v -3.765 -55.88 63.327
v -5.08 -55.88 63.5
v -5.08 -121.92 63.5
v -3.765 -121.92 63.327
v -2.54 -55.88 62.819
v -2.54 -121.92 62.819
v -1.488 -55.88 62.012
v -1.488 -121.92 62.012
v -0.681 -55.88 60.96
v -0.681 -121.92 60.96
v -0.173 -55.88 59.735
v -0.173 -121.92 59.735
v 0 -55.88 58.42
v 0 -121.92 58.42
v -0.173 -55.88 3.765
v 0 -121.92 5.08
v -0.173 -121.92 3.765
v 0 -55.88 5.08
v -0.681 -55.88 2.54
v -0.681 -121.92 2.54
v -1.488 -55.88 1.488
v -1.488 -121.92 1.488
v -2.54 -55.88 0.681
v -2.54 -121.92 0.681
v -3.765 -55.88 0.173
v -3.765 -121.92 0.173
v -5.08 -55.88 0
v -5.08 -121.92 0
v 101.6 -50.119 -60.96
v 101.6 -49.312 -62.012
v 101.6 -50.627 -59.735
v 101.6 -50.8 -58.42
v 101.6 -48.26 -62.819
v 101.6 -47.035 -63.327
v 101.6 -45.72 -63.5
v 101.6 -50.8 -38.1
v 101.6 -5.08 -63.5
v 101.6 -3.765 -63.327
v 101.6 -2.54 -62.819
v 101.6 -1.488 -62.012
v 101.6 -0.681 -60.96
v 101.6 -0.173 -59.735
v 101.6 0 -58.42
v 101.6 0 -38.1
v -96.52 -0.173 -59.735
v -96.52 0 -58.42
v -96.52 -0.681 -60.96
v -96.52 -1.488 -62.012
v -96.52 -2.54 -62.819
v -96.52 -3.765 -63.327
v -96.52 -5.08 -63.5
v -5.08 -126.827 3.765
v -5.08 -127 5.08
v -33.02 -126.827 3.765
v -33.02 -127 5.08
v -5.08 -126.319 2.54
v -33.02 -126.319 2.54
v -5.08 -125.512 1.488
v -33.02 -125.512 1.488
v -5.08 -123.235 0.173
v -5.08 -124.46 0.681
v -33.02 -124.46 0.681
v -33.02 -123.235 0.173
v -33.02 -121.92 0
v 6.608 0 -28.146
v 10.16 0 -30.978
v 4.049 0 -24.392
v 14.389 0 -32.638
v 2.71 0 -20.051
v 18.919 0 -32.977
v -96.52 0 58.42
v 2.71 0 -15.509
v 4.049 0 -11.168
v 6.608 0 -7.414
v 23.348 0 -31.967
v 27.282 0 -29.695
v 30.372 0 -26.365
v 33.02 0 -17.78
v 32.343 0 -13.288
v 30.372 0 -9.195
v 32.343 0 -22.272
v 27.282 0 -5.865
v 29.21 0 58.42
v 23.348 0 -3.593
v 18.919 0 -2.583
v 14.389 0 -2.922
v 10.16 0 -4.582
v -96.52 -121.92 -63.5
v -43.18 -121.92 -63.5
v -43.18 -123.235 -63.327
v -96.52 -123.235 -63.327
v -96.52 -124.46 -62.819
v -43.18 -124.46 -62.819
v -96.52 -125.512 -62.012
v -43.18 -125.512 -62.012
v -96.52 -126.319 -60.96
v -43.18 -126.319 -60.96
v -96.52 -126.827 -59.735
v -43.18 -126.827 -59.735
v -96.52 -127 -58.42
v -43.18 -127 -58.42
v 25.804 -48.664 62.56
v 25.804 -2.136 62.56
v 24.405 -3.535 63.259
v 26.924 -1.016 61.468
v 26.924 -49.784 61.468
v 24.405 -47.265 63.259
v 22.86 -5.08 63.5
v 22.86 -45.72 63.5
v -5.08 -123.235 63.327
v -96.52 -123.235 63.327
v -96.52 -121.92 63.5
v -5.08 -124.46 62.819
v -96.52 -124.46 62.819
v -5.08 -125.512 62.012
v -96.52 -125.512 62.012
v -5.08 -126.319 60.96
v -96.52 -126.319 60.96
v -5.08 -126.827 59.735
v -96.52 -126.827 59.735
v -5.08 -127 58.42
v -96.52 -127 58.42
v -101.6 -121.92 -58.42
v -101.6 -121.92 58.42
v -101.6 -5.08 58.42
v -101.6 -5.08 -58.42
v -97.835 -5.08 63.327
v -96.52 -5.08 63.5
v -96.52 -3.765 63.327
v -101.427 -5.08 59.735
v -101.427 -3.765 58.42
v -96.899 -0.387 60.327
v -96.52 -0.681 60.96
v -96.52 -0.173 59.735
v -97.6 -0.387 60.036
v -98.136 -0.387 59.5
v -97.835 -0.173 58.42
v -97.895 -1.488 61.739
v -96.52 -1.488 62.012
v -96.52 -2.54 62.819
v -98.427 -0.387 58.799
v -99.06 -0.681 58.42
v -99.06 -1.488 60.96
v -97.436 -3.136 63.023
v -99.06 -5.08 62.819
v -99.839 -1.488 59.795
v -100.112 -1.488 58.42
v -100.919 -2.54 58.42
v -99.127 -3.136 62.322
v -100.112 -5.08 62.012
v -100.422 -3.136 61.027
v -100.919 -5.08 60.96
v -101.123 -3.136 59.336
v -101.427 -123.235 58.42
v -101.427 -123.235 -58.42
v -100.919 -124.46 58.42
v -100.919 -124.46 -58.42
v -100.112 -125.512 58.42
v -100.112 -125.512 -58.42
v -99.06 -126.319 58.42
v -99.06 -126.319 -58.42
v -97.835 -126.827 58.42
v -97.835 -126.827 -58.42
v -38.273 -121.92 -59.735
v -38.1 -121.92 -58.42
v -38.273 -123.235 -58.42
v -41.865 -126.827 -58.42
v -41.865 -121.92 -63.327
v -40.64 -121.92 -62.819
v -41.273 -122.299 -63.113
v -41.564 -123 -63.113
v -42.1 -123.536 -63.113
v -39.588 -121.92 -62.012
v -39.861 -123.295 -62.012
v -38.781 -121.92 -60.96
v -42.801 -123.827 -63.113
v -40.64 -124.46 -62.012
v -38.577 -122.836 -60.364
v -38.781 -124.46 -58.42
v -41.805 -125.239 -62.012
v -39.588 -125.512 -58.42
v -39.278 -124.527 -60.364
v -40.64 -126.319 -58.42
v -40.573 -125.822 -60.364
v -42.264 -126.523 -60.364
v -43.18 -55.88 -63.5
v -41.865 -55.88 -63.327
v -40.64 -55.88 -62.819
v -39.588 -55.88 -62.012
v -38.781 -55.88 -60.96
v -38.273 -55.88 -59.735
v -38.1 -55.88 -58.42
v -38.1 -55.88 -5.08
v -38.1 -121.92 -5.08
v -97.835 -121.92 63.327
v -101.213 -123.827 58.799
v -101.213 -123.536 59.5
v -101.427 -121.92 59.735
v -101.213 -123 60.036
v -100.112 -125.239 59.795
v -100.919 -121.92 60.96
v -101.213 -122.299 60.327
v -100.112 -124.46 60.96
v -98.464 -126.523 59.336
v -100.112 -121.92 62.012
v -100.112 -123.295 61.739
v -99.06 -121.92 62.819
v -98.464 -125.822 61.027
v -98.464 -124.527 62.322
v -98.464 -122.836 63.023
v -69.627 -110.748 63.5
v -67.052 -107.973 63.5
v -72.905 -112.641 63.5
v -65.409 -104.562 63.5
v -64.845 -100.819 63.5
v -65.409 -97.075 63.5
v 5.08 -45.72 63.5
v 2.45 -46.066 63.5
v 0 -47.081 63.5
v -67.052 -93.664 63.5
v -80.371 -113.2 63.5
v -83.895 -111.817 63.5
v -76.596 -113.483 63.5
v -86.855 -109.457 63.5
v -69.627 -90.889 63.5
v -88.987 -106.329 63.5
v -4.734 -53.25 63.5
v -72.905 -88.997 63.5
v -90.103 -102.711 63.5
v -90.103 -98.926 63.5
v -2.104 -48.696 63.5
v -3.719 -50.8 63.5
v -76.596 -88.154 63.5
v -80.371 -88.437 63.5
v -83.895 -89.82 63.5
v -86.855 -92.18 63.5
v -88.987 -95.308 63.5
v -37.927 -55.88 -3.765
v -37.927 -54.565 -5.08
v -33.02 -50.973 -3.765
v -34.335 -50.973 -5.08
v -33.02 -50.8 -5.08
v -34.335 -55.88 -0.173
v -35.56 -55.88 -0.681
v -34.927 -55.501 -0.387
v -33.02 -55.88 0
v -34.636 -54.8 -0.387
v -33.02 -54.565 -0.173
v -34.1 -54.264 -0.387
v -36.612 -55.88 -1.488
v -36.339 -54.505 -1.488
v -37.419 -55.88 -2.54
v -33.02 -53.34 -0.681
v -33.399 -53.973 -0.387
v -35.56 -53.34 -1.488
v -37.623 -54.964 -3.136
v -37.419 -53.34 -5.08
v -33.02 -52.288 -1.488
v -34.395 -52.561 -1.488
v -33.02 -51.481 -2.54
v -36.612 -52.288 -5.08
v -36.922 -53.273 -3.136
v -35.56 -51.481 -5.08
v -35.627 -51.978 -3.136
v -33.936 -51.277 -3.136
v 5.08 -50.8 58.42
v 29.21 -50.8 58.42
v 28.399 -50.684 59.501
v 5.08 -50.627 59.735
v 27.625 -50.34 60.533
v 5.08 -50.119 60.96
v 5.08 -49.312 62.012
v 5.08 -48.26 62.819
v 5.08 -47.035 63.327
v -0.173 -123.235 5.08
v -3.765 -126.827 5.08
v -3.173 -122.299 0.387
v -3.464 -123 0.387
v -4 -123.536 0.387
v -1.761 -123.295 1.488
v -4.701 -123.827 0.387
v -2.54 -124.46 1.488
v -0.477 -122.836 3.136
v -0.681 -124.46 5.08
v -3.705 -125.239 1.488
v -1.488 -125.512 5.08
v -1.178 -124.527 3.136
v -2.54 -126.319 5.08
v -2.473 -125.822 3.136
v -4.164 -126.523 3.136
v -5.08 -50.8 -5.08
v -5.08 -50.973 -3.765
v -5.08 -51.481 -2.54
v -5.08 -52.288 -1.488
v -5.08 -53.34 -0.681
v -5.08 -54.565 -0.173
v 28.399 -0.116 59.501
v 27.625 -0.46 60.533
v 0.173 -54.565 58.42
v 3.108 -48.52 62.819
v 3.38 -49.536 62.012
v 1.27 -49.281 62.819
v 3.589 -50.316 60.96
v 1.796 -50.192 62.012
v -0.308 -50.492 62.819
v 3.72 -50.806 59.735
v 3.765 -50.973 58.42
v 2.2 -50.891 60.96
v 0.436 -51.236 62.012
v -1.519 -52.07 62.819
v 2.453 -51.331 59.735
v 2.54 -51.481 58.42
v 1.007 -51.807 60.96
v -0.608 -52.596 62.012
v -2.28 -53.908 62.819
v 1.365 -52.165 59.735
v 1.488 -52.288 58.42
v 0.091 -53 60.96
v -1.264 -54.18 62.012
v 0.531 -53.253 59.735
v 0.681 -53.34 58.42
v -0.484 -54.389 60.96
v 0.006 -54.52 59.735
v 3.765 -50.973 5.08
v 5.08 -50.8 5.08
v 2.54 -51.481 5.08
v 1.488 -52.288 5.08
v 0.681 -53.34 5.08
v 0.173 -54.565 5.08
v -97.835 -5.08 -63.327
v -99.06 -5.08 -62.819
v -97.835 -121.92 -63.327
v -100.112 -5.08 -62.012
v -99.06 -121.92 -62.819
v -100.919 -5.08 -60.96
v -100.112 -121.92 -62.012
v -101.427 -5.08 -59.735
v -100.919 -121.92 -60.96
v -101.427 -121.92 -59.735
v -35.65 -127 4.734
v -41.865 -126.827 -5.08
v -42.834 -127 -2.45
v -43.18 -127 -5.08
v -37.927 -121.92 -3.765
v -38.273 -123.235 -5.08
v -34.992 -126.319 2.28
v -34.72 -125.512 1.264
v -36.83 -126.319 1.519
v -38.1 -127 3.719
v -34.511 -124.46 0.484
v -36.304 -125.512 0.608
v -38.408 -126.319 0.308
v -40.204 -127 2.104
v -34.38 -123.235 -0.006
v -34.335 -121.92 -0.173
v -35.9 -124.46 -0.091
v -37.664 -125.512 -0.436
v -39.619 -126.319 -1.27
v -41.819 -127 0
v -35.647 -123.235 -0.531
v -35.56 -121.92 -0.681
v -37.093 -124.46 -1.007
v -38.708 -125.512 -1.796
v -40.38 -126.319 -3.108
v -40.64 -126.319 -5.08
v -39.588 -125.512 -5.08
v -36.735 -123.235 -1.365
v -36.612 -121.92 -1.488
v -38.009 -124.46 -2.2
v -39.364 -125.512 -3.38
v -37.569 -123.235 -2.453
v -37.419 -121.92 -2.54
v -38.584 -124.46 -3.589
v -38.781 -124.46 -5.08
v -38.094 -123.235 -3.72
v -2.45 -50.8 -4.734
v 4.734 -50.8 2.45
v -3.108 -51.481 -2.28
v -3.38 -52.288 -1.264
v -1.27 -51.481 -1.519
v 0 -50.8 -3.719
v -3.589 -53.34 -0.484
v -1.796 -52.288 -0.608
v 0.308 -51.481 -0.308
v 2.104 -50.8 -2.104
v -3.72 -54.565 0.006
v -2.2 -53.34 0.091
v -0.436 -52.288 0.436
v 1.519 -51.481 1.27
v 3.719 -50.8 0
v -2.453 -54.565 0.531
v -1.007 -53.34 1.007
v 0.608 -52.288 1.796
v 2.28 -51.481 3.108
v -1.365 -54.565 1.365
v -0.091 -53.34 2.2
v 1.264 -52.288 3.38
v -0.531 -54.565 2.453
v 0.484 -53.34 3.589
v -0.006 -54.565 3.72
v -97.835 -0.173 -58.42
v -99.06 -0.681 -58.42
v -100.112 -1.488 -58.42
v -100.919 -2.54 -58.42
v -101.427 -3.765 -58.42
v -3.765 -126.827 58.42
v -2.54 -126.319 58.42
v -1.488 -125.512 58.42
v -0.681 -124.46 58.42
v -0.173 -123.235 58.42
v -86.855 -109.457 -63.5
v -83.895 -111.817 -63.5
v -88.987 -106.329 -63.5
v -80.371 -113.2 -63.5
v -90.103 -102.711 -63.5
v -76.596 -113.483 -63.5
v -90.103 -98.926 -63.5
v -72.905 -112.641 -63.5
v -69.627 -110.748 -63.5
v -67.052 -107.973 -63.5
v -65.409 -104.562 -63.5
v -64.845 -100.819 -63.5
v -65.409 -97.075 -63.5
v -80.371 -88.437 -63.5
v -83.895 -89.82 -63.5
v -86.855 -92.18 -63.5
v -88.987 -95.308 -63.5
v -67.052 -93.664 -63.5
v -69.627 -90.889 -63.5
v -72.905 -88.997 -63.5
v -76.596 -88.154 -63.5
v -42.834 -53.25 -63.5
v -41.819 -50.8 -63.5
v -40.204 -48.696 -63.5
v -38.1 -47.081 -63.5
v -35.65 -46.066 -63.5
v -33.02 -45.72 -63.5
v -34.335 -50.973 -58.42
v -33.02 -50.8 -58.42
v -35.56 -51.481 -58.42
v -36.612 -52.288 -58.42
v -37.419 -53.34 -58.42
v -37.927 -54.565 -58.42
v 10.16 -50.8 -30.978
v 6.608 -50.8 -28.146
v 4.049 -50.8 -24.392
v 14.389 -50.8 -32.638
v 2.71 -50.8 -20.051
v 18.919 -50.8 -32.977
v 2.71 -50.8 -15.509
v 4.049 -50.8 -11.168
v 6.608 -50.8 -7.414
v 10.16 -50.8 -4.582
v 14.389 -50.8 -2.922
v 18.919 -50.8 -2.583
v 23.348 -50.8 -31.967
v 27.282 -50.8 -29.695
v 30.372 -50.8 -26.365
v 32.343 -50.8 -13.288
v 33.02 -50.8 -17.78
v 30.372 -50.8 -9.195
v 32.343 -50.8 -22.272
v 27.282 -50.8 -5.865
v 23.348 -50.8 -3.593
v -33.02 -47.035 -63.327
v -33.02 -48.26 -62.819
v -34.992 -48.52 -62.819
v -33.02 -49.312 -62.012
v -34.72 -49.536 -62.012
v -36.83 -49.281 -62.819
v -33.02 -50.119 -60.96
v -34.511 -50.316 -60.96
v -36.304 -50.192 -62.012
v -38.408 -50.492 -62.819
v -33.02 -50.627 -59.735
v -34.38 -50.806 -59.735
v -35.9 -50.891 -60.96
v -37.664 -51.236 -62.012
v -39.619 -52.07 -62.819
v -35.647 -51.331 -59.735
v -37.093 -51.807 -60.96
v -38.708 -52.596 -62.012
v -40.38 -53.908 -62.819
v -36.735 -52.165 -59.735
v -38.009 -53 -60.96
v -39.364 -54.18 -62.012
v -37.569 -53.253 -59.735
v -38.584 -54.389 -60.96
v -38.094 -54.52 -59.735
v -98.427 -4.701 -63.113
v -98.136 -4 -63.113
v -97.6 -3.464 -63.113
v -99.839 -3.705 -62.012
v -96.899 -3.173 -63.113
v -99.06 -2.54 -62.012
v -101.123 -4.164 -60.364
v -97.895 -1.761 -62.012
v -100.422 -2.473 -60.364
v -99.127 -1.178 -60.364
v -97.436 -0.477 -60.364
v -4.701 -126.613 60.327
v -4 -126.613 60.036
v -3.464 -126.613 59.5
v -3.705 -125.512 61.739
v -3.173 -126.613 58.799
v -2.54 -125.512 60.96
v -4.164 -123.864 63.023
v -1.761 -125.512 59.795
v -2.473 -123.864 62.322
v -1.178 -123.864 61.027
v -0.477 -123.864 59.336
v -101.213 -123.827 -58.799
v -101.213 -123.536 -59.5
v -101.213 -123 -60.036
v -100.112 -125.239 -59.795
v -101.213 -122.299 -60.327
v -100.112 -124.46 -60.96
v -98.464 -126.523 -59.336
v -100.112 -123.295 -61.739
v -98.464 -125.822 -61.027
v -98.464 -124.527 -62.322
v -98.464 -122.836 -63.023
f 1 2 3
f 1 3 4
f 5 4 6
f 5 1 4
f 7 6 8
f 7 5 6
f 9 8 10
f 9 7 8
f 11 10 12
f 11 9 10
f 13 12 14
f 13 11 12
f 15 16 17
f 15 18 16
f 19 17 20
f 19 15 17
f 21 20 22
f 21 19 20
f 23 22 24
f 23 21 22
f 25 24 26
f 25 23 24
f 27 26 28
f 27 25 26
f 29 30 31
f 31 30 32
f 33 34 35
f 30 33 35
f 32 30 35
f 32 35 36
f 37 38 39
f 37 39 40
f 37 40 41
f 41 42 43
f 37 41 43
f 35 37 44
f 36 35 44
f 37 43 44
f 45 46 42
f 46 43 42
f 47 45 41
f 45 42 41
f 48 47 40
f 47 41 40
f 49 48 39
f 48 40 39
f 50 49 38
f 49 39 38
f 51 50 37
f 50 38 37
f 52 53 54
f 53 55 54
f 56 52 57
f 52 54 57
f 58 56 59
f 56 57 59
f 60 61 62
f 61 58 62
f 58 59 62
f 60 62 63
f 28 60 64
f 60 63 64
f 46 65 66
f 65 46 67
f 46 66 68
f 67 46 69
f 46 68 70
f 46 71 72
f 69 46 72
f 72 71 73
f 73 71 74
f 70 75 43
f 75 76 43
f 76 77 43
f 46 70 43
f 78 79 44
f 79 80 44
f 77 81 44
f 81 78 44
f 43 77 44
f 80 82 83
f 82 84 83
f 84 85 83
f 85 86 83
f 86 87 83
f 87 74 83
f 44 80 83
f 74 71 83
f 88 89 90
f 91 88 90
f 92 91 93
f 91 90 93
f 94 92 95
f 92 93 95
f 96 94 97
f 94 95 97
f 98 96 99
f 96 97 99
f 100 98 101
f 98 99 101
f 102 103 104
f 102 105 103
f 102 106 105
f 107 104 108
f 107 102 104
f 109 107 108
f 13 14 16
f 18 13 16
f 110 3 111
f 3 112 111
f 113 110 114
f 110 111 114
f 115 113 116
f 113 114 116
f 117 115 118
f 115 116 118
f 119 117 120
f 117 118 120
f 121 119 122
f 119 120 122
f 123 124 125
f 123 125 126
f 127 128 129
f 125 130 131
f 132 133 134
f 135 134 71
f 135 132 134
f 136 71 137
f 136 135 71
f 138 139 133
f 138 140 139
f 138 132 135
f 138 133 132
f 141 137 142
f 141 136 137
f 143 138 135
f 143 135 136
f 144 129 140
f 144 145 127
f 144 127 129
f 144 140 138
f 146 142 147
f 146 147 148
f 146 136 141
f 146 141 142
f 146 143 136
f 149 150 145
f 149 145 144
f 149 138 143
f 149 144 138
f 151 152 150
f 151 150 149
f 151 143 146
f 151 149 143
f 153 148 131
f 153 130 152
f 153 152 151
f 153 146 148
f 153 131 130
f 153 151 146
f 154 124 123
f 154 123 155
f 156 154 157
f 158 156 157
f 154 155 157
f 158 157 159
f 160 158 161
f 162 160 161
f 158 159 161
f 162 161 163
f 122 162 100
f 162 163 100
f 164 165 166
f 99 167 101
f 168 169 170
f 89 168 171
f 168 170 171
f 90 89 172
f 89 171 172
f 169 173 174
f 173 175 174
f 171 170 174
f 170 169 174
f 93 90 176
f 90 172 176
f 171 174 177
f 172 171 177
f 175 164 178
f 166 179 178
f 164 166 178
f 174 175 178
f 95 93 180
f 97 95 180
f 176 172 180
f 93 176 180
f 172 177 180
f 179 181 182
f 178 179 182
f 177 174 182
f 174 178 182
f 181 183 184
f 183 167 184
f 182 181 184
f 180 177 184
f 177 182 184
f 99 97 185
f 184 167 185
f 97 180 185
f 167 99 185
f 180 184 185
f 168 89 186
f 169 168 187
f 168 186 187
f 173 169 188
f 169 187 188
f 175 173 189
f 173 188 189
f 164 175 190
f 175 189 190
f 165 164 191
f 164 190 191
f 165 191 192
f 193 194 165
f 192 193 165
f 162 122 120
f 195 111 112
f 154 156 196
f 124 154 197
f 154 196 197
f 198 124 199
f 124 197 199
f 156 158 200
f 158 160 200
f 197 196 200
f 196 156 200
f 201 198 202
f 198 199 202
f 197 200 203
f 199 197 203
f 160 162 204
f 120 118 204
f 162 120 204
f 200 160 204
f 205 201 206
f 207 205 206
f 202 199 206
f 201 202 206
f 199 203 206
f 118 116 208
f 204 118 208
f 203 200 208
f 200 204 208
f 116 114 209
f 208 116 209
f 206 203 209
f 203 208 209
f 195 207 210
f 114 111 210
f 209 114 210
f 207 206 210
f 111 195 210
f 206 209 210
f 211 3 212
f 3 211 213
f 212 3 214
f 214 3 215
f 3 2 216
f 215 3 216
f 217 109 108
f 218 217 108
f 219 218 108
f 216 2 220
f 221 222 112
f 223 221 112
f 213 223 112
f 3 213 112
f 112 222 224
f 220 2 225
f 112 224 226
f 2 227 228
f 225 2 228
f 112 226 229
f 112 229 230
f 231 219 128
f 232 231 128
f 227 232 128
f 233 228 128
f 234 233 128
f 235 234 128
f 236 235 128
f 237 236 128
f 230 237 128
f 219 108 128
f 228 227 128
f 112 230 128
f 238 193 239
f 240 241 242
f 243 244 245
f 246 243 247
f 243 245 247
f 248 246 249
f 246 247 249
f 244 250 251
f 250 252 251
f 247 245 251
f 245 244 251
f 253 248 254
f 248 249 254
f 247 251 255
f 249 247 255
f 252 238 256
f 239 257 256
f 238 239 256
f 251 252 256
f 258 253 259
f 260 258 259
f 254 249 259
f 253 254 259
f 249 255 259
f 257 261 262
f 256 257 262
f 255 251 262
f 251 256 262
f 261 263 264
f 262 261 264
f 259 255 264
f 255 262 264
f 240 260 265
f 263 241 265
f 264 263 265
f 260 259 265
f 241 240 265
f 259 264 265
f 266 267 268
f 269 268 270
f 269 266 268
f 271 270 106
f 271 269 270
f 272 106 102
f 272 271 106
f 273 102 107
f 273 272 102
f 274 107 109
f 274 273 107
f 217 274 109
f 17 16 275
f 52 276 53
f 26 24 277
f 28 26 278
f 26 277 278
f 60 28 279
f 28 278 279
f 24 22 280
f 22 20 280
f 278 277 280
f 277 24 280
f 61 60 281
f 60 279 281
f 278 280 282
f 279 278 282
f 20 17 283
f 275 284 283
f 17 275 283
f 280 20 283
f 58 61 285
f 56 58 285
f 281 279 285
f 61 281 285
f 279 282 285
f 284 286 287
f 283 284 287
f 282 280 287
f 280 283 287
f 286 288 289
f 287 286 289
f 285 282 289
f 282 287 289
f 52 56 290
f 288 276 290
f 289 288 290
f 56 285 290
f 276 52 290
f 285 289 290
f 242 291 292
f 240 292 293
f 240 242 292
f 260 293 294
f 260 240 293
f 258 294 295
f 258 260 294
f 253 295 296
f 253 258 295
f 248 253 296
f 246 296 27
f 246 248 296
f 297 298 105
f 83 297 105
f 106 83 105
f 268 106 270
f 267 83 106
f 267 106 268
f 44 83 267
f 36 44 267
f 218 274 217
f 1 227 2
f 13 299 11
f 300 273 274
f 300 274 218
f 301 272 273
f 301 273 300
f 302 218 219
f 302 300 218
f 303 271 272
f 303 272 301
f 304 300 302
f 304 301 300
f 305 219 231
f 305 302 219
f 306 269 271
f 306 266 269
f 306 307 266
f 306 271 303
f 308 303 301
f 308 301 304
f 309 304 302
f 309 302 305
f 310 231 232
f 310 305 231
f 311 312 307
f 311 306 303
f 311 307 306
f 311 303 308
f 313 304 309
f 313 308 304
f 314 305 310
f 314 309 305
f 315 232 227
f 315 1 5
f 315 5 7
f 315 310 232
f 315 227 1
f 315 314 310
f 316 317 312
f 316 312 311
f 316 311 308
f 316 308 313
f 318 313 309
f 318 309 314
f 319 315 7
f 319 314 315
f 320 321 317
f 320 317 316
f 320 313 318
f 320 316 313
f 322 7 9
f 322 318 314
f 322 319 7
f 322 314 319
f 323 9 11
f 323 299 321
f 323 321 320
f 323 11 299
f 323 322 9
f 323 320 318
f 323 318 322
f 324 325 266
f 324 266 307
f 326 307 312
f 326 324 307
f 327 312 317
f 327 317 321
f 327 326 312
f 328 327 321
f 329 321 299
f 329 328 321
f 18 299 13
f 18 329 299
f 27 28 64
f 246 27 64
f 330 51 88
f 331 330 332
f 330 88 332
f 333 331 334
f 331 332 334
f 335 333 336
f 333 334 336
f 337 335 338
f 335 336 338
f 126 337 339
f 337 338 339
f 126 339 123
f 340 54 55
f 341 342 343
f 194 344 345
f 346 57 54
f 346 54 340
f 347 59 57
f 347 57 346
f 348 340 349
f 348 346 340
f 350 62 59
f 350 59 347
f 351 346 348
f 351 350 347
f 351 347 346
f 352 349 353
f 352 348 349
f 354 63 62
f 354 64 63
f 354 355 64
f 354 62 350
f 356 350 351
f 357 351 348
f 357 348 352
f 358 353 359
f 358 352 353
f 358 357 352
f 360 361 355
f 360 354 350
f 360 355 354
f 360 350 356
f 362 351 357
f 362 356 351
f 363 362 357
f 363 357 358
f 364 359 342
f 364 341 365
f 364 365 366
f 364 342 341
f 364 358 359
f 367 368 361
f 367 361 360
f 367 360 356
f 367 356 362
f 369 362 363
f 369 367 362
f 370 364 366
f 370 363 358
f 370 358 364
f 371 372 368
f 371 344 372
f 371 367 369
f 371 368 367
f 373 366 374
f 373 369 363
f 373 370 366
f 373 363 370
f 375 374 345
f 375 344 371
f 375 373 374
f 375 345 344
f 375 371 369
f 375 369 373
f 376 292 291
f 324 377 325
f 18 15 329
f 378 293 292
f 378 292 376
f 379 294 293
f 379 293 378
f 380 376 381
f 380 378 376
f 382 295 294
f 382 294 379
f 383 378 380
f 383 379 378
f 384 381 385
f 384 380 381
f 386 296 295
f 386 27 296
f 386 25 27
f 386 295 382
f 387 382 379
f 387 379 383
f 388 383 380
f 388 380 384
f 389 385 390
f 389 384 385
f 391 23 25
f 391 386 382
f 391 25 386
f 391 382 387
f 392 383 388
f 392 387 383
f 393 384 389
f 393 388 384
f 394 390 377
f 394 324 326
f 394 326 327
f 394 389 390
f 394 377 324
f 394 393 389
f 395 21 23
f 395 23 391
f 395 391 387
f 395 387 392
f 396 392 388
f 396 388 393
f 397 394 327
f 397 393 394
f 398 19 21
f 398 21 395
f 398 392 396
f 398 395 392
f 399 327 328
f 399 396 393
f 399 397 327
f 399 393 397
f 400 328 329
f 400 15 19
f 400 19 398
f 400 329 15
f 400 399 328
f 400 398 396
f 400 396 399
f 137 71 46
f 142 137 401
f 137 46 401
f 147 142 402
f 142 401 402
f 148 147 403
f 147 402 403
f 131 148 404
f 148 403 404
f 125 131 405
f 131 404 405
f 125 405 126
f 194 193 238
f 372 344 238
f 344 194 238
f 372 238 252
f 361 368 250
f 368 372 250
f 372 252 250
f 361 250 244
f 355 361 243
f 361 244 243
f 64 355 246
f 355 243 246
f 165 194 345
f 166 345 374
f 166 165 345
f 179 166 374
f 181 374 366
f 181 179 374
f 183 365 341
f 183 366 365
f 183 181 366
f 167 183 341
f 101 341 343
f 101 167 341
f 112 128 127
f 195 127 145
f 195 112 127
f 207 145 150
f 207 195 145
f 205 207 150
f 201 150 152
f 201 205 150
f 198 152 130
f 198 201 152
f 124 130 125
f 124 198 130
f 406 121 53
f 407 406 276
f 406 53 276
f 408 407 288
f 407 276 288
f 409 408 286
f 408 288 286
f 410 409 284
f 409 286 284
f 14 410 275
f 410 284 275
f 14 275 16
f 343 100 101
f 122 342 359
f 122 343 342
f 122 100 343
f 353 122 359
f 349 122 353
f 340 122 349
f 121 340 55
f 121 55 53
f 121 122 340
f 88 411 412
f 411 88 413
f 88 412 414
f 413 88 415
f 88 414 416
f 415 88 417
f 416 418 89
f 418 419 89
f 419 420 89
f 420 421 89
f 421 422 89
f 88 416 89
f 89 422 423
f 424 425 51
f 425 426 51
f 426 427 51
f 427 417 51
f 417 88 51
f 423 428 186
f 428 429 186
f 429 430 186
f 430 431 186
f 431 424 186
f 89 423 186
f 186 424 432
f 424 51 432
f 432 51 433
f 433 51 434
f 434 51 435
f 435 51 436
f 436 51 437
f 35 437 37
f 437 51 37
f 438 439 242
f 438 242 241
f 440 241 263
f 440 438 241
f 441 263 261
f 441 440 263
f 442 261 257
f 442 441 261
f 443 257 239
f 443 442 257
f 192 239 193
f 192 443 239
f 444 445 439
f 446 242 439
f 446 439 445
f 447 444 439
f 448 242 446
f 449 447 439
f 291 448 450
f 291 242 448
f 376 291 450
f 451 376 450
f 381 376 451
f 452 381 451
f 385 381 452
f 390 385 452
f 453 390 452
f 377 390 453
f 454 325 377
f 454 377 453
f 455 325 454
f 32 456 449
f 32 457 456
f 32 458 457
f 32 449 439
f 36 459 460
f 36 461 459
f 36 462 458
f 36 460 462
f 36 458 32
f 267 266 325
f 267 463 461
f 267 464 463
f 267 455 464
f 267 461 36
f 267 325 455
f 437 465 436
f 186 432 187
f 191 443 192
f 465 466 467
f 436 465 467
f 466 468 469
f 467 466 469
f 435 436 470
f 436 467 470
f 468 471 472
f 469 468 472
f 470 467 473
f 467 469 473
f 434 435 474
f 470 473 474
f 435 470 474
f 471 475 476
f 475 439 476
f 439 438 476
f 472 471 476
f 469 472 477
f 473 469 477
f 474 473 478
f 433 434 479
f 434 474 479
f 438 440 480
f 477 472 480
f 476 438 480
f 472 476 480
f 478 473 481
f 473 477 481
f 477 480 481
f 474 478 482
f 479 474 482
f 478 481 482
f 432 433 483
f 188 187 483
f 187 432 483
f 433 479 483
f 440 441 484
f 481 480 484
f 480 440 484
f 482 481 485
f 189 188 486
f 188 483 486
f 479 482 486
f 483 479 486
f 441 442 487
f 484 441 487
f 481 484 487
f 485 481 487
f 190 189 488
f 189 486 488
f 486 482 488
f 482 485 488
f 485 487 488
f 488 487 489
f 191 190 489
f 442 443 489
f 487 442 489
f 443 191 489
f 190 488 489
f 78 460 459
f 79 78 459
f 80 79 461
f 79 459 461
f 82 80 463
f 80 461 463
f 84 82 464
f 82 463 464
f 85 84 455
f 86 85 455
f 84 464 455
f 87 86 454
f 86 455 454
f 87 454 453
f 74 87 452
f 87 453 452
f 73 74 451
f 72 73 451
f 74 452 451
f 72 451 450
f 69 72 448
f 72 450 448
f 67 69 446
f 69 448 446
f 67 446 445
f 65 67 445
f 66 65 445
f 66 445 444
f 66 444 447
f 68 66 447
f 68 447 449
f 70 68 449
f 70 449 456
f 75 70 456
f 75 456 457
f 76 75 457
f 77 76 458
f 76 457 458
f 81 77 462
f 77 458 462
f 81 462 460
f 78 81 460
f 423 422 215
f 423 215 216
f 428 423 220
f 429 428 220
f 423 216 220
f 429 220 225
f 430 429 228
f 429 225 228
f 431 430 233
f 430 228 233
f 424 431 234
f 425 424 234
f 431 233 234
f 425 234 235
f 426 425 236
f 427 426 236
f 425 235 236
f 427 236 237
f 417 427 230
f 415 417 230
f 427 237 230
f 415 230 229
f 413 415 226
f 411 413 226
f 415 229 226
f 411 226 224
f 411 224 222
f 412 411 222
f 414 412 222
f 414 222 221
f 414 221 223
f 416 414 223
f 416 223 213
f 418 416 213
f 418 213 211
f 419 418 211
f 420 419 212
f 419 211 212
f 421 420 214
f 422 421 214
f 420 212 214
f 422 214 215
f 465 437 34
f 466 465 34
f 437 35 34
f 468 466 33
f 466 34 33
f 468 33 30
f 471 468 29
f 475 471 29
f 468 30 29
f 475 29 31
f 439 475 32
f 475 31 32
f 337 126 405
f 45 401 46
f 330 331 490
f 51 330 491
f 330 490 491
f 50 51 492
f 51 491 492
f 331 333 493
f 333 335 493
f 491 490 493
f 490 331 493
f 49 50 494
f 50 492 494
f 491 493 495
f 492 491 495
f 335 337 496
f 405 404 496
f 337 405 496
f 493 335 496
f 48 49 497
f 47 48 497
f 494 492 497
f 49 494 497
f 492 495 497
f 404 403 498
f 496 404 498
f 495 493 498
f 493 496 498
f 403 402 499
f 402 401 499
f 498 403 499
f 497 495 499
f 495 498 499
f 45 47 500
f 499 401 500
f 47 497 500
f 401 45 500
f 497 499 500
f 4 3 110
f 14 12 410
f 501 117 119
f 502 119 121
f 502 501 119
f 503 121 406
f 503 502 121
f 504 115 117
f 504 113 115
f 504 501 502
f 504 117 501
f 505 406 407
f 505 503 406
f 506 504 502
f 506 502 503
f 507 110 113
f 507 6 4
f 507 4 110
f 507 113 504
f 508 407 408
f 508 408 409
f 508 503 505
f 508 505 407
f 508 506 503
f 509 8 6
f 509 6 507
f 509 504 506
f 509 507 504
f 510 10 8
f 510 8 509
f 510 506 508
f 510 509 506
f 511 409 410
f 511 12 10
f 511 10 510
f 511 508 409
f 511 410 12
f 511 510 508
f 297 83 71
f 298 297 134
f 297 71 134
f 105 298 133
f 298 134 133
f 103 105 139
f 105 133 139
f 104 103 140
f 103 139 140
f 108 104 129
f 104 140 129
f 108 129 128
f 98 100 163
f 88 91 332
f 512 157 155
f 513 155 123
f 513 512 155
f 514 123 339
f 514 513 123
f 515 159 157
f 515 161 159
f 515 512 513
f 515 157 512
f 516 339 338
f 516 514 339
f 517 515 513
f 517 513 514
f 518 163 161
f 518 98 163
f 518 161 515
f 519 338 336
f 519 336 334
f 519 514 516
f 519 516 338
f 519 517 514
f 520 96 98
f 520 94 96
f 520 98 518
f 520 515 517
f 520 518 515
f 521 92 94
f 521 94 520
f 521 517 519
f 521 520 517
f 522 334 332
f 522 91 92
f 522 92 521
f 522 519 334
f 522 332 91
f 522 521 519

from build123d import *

# Parameters (mm, degrees)
F1_DEPTH = 127
F3_DEPTH = 76.2
F4_SIZE2 = 101.6
F4_SIZE  = 76.2
F5_R     = 5.08
F6_R     = 15.24
F7_DEPTH = 50.8
F8_R     = 12.7
F9_DEPTH = 127


with BuildPart() as f1:
    # F0 (on Front) → F1 (new body)
    with BuildSketch(Plane.XZ):
        Polygon((-38.1, -63.5), (101.6, -63.5), (101.6, 63.5), (0, 63.5), (0, 0), (-38.1, 0), align=None)
        Polygon((-101.6, -63.5), (-38.1, -63.5), (-38.1, 0), (0, 0), (0, 63.5), (-101.6, 63.5), align=None)
    extrude(amount=F1_DEPTH)

    # F2 (on face) → F3 (cut)
    with BuildSketch(Plane.XZ.offset(127)):
        Polygon((-38.1, 0), (-38.1, -63.5), (101.6, -63.5), (101.6, 63.5), (0, 63.5), (0, 0), align=None)
    extrude(amount=-F3_DEPTH, mode=Mode.SUBTRACT)

    # F4
    f4_edges = [f1.edges().sort_by_distance(p)[0] for p in [
        (101.6, -25.4, 63.5),
    ]]
    f4_side = f1.faces().sort_by_distance((-21.771429, -52.614286, 63.5))[0]
    chamfer(f4_edges, length=F4_SIZE, length2=F4_SIZE2, reference=f4_side)

    # F5
    f5_edges = [f1.edges().sort_by_distance(p)[0] for p in [
        (12.7, -50.8, 63.5),
        (25.4, -25.4, 63.5),
        (0, -88.9, 63.5),
        (-50.8, -127, 63.5),
        (0, -127, 31.75),
        (0, -88.9, 0),
        (-19.05, -127, 0),
        (-38.1, -127, -31.75),
        (-38.1, -88.9, -63.5),
        (-69.85, -127, -63.5),
        (-101.6, -127, 0),
        (-101.6, -63.5, 63.5),
        (-38.1, 0, 63.5),
        (-38.1, -50.8, -31.75),
        (-38.1, -88.9, 0),
        (-19.05, -50.8, 0),
        (-101.6, 0, 0),
        (-101.6, -63.5, -63.5),
        (0, 0, -63.5),
        (31.75, -50.8, -63.5),
        (0, -50.8, 31.75),
    ]]
    fillet(f5_edges, radius=F5_R)

    # F6 (on face) → F7 (cut, through all)
    with BuildSketch(Plane.XZ.offset(50.8)):
        with Locations((17.78, -17.78)):
            Circle(F6_R)
    extrude(amount=-F7_DEPTH, mode=Mode.SUBTRACT)

    # F8 (on face) → F9 (cut, through all)
    with BuildSketch(Plane.XY.offset(63.5)):
        with Locations((-77.5449126959, -100.8186563849)):
            Circle(F8_R)
    extrude(amount=-F9_DEPTH, mode=Mode.SUBTRACT)


solid = f1.part
